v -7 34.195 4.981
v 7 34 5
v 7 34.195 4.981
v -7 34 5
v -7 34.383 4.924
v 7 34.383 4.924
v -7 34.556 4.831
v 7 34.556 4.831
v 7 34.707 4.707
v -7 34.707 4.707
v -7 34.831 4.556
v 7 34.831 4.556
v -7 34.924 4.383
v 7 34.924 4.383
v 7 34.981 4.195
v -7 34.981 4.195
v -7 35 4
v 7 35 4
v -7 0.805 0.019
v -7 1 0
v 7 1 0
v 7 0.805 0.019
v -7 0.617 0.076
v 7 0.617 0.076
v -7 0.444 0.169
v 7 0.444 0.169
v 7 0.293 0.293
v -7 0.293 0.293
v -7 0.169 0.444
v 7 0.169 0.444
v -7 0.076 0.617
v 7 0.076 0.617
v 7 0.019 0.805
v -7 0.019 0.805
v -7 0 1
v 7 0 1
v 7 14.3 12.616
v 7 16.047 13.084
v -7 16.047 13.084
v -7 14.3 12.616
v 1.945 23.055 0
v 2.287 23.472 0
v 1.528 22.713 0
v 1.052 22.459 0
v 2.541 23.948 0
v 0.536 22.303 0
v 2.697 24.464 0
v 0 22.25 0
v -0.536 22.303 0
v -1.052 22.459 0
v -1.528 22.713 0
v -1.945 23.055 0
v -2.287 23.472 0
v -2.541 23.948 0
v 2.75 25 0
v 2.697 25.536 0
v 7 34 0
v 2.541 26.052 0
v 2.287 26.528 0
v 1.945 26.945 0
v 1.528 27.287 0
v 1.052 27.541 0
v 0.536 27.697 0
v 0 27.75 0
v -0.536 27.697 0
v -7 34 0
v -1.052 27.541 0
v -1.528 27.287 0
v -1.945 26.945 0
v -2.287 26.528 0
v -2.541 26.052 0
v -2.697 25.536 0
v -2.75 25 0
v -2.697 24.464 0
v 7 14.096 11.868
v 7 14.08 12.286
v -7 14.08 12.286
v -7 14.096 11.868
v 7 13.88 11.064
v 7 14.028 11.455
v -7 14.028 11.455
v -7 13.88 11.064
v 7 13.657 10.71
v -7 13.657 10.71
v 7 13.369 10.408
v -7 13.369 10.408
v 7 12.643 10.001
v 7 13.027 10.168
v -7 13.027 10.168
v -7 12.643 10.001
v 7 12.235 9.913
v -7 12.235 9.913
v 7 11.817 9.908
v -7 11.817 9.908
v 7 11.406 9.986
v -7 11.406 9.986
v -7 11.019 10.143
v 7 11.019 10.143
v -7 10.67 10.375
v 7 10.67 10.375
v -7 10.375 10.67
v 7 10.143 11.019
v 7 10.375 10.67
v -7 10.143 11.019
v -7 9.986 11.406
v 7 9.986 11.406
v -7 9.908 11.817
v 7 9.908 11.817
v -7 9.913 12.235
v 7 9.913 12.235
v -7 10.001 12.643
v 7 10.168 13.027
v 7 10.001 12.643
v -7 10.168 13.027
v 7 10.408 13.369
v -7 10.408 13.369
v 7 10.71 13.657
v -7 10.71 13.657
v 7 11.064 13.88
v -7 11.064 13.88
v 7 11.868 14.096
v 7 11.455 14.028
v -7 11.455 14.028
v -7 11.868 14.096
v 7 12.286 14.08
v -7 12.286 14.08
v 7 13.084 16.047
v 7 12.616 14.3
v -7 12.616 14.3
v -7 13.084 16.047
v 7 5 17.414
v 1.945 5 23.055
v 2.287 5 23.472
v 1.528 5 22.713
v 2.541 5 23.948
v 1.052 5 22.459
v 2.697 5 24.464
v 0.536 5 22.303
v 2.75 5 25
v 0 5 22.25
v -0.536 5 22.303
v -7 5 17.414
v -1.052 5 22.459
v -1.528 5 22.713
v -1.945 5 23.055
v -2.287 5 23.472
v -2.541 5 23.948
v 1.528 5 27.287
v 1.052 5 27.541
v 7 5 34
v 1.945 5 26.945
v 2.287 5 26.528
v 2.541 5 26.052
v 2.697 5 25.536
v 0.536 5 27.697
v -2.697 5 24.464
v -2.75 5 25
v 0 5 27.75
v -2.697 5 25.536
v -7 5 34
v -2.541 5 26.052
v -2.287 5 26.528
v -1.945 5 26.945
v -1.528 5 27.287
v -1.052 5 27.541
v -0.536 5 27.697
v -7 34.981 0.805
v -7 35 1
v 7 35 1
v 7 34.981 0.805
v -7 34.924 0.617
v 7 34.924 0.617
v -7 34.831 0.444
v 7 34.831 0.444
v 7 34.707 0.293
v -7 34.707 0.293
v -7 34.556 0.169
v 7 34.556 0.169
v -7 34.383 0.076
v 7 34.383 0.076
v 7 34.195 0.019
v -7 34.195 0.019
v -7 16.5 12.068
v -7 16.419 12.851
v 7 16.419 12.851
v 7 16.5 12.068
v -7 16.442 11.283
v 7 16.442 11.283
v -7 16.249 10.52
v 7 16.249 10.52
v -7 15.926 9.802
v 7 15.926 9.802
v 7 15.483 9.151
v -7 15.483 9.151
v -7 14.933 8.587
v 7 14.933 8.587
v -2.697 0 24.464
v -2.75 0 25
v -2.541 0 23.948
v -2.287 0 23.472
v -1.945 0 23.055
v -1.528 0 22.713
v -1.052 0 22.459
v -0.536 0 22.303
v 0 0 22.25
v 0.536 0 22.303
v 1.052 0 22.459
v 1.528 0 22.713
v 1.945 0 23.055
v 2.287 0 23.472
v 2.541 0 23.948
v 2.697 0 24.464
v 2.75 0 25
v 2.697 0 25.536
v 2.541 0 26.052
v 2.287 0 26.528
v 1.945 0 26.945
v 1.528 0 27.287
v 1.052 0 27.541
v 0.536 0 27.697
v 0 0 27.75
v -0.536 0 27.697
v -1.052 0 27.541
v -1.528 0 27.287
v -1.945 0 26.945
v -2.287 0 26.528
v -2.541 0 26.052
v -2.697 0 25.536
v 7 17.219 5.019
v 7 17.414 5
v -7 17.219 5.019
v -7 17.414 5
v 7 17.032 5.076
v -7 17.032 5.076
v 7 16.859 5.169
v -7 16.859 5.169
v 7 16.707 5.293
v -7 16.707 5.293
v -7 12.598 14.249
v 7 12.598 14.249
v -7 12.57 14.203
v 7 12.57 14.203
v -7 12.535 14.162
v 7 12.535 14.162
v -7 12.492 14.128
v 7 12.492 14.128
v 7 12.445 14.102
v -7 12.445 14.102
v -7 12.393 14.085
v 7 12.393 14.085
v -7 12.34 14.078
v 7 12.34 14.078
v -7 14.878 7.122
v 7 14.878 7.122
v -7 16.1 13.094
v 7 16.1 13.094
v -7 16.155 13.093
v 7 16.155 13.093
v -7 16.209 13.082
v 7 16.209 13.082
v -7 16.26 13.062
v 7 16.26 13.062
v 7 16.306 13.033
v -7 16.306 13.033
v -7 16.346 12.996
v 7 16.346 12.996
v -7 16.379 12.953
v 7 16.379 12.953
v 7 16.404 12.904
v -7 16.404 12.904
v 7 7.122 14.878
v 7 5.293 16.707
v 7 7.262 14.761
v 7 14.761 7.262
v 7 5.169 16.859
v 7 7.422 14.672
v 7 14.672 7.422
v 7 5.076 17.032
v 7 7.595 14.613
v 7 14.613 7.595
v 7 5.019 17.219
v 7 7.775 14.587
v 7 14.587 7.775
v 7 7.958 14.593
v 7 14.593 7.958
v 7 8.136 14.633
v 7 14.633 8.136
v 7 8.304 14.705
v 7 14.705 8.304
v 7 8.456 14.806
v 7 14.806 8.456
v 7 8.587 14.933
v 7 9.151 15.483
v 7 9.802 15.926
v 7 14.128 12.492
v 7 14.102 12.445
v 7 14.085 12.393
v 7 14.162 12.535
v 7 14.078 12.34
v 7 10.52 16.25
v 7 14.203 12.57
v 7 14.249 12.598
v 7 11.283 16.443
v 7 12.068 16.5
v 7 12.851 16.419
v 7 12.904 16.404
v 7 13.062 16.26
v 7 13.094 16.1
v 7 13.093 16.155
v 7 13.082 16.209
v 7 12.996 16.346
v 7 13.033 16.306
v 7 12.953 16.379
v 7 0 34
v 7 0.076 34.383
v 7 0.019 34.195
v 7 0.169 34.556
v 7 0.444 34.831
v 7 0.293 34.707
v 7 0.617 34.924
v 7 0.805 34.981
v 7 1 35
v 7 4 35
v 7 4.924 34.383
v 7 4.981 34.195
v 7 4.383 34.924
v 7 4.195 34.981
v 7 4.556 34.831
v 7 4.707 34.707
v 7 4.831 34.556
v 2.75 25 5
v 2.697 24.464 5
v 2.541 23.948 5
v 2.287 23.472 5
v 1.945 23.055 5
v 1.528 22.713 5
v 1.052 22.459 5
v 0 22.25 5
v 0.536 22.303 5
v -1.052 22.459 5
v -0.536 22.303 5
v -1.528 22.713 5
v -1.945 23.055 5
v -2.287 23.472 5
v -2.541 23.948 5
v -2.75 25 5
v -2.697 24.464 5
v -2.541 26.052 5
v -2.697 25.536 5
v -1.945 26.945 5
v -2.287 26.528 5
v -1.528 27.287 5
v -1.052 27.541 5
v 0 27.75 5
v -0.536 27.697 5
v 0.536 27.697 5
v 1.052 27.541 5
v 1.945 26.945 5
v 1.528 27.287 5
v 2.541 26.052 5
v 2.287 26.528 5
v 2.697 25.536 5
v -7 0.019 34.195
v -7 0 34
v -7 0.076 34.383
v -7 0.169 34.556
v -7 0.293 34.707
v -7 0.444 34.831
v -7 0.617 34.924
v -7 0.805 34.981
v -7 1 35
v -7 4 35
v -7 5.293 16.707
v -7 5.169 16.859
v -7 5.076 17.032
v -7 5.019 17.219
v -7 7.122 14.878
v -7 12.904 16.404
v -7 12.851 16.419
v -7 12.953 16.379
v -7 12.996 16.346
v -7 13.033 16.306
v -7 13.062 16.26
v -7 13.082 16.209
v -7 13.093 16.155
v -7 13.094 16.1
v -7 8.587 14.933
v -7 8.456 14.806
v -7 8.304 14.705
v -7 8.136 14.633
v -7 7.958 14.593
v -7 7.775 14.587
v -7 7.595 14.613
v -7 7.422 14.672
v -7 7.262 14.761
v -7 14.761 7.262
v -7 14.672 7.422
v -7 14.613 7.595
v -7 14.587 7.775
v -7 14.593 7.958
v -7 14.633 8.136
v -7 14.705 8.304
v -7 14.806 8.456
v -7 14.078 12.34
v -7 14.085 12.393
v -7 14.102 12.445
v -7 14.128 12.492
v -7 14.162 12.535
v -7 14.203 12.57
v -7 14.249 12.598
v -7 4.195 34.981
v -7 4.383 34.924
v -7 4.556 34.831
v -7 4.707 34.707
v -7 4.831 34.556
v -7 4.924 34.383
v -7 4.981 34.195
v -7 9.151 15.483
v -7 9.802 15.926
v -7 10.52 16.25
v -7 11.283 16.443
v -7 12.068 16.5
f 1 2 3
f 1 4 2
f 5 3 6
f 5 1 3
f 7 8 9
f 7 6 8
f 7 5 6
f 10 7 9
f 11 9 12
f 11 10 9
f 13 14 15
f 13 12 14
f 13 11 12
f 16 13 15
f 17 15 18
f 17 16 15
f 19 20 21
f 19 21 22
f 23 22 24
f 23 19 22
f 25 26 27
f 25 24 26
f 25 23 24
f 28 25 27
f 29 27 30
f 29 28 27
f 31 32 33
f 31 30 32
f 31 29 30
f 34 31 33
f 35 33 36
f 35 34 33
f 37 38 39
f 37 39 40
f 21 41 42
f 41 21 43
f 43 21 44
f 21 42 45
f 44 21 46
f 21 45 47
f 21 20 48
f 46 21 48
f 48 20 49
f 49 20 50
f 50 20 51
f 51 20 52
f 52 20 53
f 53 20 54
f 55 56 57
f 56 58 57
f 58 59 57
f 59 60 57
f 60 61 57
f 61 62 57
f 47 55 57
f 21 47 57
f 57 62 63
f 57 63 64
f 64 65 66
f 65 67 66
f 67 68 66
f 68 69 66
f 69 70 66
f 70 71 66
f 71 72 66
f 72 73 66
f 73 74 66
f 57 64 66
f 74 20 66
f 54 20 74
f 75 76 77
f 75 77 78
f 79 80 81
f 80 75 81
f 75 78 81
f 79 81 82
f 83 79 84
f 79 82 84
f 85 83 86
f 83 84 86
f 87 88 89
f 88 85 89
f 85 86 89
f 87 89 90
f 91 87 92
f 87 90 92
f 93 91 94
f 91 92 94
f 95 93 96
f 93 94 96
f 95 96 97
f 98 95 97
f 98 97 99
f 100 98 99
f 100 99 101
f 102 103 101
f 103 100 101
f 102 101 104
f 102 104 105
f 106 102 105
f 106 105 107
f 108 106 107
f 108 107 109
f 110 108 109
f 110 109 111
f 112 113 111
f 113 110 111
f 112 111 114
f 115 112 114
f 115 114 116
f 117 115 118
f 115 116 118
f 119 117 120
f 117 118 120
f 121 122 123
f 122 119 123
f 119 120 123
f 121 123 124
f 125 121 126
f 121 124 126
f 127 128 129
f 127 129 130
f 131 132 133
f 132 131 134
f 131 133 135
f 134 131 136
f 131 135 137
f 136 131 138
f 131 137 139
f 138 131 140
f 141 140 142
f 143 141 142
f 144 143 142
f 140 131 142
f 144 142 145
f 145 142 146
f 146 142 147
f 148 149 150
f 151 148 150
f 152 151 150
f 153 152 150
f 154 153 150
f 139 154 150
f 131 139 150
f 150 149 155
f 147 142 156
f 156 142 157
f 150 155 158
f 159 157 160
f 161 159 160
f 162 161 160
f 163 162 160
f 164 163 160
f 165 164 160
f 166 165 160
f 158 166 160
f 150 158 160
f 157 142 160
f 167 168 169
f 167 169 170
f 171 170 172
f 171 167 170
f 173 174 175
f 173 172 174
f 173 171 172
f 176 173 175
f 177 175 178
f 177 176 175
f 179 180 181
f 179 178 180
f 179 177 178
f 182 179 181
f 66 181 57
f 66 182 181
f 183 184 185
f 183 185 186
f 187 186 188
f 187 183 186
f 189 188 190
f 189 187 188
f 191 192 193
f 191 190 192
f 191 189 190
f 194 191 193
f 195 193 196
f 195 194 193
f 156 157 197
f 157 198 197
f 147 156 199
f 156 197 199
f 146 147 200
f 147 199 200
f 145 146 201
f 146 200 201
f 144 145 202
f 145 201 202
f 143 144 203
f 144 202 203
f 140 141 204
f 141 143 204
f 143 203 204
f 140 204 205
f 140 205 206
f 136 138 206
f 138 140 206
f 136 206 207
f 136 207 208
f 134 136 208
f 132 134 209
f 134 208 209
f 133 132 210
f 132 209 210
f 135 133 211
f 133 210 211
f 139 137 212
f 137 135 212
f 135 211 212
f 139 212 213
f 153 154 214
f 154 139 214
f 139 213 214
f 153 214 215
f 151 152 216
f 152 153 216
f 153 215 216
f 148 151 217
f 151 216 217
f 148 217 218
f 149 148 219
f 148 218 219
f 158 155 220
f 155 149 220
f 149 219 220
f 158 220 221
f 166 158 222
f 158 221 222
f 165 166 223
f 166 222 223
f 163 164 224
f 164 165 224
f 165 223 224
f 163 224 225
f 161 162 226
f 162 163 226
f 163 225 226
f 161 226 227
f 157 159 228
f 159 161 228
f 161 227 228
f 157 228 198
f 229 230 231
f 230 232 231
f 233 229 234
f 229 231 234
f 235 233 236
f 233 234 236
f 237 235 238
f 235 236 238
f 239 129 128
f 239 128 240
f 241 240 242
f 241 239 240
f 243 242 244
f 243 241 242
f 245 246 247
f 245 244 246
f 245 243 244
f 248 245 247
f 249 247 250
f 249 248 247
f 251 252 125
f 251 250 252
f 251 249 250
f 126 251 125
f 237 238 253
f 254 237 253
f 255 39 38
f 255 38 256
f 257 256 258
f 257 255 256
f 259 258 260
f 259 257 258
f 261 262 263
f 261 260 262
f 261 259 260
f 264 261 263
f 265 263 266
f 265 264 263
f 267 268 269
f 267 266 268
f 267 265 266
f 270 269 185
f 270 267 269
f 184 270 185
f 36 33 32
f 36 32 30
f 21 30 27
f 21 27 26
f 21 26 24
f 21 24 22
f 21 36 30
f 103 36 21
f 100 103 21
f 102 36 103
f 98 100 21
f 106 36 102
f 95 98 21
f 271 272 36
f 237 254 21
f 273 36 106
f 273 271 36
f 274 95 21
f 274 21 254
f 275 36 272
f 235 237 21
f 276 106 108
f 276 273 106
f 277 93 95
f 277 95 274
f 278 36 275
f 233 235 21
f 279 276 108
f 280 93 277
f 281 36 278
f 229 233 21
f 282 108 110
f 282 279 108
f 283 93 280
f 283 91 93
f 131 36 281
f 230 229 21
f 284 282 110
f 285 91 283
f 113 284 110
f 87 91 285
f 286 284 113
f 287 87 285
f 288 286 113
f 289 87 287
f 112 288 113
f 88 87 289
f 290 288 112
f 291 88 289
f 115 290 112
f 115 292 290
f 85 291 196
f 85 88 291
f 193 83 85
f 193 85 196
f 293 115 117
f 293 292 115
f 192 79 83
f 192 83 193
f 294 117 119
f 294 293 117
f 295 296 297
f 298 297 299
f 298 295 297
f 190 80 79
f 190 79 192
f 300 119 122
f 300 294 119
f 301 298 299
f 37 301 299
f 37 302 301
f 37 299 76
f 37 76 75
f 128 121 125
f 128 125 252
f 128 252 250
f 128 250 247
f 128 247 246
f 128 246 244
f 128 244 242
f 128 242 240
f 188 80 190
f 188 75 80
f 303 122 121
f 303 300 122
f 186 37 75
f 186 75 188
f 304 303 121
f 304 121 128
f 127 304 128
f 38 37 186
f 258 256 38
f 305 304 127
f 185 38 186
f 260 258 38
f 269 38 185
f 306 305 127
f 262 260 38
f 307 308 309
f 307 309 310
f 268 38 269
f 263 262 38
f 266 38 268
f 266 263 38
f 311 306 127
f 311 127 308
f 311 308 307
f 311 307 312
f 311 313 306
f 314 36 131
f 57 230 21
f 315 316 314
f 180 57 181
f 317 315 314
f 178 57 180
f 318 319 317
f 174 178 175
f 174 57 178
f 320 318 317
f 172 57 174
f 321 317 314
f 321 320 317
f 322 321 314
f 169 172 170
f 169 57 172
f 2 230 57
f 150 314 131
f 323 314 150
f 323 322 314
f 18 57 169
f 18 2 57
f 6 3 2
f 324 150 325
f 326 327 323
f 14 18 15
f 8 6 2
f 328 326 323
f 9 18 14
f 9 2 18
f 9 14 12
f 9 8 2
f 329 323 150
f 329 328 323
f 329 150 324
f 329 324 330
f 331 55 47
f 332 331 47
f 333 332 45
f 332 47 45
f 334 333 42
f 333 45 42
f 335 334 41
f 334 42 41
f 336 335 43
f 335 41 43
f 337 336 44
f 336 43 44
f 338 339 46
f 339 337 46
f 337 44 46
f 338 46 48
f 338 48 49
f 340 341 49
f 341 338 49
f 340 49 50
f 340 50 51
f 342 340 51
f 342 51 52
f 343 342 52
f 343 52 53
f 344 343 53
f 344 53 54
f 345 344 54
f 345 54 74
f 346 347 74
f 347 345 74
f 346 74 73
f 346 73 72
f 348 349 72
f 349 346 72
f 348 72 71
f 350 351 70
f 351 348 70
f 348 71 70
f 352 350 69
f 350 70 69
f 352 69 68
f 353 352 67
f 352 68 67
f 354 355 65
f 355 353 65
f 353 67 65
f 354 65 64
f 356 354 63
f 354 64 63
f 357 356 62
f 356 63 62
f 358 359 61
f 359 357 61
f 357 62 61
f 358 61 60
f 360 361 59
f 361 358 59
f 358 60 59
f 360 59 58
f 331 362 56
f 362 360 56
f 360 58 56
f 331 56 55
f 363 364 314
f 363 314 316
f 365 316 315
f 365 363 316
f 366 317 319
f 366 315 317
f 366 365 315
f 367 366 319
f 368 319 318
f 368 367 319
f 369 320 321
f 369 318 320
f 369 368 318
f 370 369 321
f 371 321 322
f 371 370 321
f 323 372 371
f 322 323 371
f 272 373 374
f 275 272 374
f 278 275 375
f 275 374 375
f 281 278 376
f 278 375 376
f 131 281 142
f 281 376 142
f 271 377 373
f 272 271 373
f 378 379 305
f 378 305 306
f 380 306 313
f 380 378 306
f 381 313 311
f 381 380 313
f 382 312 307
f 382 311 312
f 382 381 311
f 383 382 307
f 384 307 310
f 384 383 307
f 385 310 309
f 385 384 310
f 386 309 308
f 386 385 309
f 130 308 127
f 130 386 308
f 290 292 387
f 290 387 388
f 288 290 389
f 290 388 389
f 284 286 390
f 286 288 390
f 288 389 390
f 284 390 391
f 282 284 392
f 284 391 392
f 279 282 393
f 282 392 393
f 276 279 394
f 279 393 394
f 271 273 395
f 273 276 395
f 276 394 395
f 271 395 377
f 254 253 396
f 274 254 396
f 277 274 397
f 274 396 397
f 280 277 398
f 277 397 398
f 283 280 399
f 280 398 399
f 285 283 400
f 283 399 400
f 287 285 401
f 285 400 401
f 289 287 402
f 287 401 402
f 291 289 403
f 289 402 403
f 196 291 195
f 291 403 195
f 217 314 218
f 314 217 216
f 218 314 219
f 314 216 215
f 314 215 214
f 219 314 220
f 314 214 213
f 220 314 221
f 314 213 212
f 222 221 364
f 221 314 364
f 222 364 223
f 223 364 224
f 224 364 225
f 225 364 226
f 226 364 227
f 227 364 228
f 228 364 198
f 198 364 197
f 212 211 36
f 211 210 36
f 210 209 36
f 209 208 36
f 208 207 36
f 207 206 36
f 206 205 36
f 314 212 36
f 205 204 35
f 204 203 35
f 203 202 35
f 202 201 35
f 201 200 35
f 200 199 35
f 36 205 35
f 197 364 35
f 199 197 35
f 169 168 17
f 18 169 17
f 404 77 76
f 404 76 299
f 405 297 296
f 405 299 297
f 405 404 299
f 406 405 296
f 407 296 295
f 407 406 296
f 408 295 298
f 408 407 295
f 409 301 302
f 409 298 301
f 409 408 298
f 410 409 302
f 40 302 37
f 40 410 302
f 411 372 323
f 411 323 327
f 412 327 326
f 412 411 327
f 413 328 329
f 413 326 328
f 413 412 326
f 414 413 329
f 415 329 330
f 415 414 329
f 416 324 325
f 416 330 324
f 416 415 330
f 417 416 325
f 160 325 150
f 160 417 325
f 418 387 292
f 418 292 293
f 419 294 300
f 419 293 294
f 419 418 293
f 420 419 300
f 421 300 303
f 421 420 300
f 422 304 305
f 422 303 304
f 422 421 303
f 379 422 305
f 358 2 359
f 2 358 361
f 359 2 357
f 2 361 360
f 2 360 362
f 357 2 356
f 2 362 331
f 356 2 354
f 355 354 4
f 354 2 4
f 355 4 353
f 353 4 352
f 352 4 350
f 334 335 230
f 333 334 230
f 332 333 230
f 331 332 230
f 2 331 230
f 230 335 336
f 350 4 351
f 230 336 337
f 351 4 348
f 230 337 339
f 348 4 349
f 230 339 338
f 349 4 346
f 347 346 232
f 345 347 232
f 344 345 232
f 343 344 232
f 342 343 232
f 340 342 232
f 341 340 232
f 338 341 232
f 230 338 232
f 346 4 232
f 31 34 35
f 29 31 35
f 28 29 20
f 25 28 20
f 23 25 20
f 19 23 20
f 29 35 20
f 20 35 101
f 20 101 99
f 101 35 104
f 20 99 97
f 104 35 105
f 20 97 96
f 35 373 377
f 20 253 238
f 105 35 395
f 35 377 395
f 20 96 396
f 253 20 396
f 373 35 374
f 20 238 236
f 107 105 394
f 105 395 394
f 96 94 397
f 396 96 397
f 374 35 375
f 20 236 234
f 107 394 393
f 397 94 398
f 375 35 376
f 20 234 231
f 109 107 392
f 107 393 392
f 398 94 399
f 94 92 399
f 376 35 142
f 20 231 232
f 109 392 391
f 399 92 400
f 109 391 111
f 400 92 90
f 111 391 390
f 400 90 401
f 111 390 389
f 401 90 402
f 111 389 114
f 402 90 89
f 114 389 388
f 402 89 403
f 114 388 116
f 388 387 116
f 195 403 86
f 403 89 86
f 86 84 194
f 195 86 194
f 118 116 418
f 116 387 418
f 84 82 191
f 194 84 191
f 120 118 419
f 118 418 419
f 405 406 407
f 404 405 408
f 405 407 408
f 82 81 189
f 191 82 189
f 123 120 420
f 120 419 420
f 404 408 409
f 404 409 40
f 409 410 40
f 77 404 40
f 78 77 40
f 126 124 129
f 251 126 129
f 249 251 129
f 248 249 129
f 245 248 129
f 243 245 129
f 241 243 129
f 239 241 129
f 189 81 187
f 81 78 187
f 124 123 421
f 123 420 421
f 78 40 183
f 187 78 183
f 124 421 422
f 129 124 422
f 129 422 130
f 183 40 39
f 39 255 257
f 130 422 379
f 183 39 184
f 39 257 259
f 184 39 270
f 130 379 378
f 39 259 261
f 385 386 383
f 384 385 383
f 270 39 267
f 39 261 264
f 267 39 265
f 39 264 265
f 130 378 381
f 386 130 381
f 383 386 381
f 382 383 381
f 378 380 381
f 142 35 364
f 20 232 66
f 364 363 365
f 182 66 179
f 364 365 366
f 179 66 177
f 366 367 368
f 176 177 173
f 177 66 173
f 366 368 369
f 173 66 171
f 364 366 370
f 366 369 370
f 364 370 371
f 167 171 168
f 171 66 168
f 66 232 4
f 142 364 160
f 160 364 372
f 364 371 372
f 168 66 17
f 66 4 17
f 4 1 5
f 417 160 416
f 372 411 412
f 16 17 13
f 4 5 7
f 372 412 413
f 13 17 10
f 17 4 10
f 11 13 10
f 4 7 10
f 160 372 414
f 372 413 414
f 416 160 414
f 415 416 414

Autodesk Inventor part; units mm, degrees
sketch "Sketch_1" plane through (0, 0, 0) normal (1, 0, 0) x (0, 1, 0)
  line L0 (4, 35) -> (1, 35)
  arc A0 (1, 35) -> (0, 34) centre (1, 34) ccw
  line L1 (0, 34) -> (0, 1)
  arc A1 (0, 1) -> (1, 0) centre (1, 1) ccw
  line L2 (1, 0) -> (34, 0)
  arc A2 (34, 0) -> (35, 1) centre (34, 1) ccw
  line L3 (35, 1) -> (35, 4)
  arc A3 (35, 4) -> (34, 5) centre (34, 4) ccw
  line L4 (34, 5) -> (17.4142, 5)
  arc A4 (16.7071, 5.2929) -> (17.4142, 5) centre (17.4142, 6) ccw
  line L5 (16.7071, 5.2929) -> (14.878, 7.122)
  arc A5 (14.9333, 8.5874) -> (14.878, 7.122) centre (15.5851, 7.8291) ccw
  arc A6 (14.9333, 8.5874) -> (16.4188, 12.8512) centre (12, 12) ccw
  arc A7 (16.4188, 12.8512) -> (16.0465, 13.0843) centre (16.1242, 12.7945) ccw
  line L6 (16.0465, 13.0843) -> (14.3, 12.6163)
  arc A8 (14.3, 12.6163) -> (14.0805, 12.2857) centre (14.3777, 12.3265) ccw
  arc A9 (12.2857, 14.0805) -> (14.0805, 12.2857) centre (12, 12) ccw
  arc A10 (12.2857, 14.0805) -> (12.6163, 14.3) centre (12.3265, 14.3777) ccw
  line L7 (12.6163, 14.3) -> (13.0843, 16.0465)
  arc A11 (13.0843, 16.0465) -> (12.8512, 16.4188) centre (12.7945, 16.1242) ccw
  arc A12 (12.8512, 16.4188) -> (8.5874, 14.9333) centre (12, 12) ccw
  arc A13 (7.122, 14.878) -> (8.5874, 14.9333) centre (7.8291, 15.5851) ccw
  line L8 (7.122, 14.878) -> (5.2929, 16.7071)
  arc A14 (5, 17.4142) -> (5.2929, 16.7071) centre (6, 17.4142) ccw
  line L9 (5, 17.4142) -> (5, 34)
  arc A15 (5, 34) -> (4, 35) centre (4, 34) ccw
extrude "Extrusion1" add sketch "Sketch_1" along normal mid plane 14
sketch "Sketch_2" plane through (0, 0, 0) normal (0, 0, 1) x (1, 0, 0)
  circle A0 centre (0, 25) radius 2.75
extrude "Extrusion2" cut sketch "Sketch_2" along normal mid plane 10
sketch "Sketch_3" plane through (0, 0, 0) normal (0, 1, 0) x (-1, 0, 0)
  circle A0 centre (0, 25) radius 2.75
extrude "Extrusion3" cut sketch "Sketch_3" along normal mid plane 10
ref_plane "bracket_to_dummy_XY" through (0, 0, 0) normal (0, 1, 0) x (1, 0, 0)
ref_plane "bracket_to_dummy_YZ" through (0, 0, 0) normal (1, 0, 0) x (0, 0, -1)
ref_plane "bracket_to_dummy_ZX" through (0, 0, 0) normal (0, 0, -1) x (0, 1, 0)
ref_plane "to_bolt_1_6_XY" through (0, 25, 5) normal (0, 0, 1) x (1, 0, 0)
ref_plane "to_bolt_1_6_YZ" through (0, 25, 5) normal (1, 0, 0) x (0, 1, 0)
ref_plane "to_bolt_1_6_ZX" through (0, 25, 5) normal (0, 1, 0) x (0, 0, 1)
ref_plane "to_bolt_1_6_base_XY" through (0, 5, 25) normal (0, 1, 0) x (1, 0, 0)
ref_plane "to_bolt_1_6_base_YZ" through (0, 5, 25) normal (1, 0, 0) x (0, 0, -1)
ref_plane "to_bolt_1_6_base_ZX" through (0, 5, 25) normal (0, 0, -1) x (0, 1, 0)
ref_plane "to_nut_1_6_XY" through (0, 25, -2) normal (0, 0, 1) x (1, 0, 0)
ref_plane "to_nut_1_6_YZ" through (0, 25, -2) normal (1, 0, 0) x (0, 1, 0)
ref_plane "to_nut_1_6_ZX" through (0, 25, -2) normal (0, 1, 0) x (0, 0, 1)
ref_plane "to_nut_1_6_base_XY" through (0, -2, 25) normal (0, 1, 0) x (1, 0, 0)
ref_plane "to_nut_1_6_base_YZ" through (0, -2, 25) normal (1, 0, 0) x (0, 0, -1)
ref_plane "to_nut_1_6_base_ZX" through (0, -2, 25) normal (0, 0, -1) x (0, 1, 0)
ref_plane "to_screw_XY" through (0, 5, 25) normal (0, 1, 0) x (1, 0, 0)
ref_plane "to_screw_YZ" through (0, 5, 25) normal (1, 0, 0) x (0, 0, -1)
ref_plane "to_screw_ZX" through (0, 5, 25) normal (0, 0, -1) x (0, 1, 0)
ref_plane "to_screw10_XY" through (0, 5, 25) normal (0, 1, 0) x (1, 0, 0)
ref_plane "to_screw10_YZ" through (0, 5, 25) normal (1, 0, 0) x (0, 0, -1)
ref_plane "to_screw10_ZX" through (0, 5, 25) normal (0, 0, -1) x (0, 1, 0)
ref_plane "to_screw2_XY" through (0, 5, 25) normal (0, 1, 0) x (1, 0, 0)
ref_plane "to_screw2_YZ" through (0, 5, 25) normal (1, 0, 0) x (0, 0, -1)
ref_plane "to_screw2_ZX" through (0, 5, 25) normal (0, 0, -1) x (0, 1, 0)
ref_plane "to_screw3_XY" through (0, 25, 5) normal (0, 0, 1) x (1, 0, 0)
ref_plane "to_screw3_YZ" through (0, 25, 5) normal (1, 0, 0) x (0, 1, 0)
ref_plane "to_screw3_ZX" through (0, 25, 5) normal (0, 1, 0) x (0, 0, 1)
ref_plane "to_screw4_XY" through (0, 25, 5) normal (0, 0, 1) x (1, 0, 0)
ref_plane "to_screw4_YZ" through (0, 25, 5) normal (1, 0, 0) x (0, 1, 0)
ref_plane "to_screw4_ZX" through (0, 25, 5) normal (0, 1, 0) x (0, 0, 1)
ref_plane "to_screw5_XY" through (0, 5, 25) normal (0, 1, 0) x (1, 0, 0)
ref_plane "to_screw5_YZ" through (0, 5, 25) normal (1, 0, 0) x (0, 0, -1)
ref_plane "to_screw5_ZX" through (0, 5, 25) normal (0, 0, -1) x (0, 1, 0)
ref_plane "to_screw6_XY" through (0, 5, 25) normal (0, 1, 0) x (1, 0, 0)
ref_plane "to_screw6_YZ" through (0, 5, 25) normal (1, 0, 0) x (0, 0, -1)
ref_plane "to_screw6_ZX" through (0, 5, 25) normal (0, 0, -1) x (0, 1, 0)
ref_plane "to_screw7_XY" through (0, 25, 5) normal (0, 0, 1) x (1, 0, 0)
ref_plane "to_screw7_YZ" through (0, 25, 5) normal (1, 0, 0) x (0, 1, 0)
ref_plane "to_screw7_ZX" through (0, 25, 5) normal (0, 1, 0) x (0, 0, 1)
ref_plane "to_screw8_XY" through (0, 25, 5) normal (0, 0, 1) x (1, 0, 0)
ref_plane "to_screw8_YZ" through (0, 25, 5) normal (1, 0, 0) x (0, 1, 0)
ref_plane "to_screw8_ZX" through (0, 25, 5) normal (0, 1, 0) x (0, 0, 1)
ref_plane "to_screw9_XY" through (0, 25, 5) normal (0, 0, 1) x (1, 0, 0)
ref_plane "to_screw9_YZ" through (0, 25, 5) normal (1, 0, 0) x (0, 1, 0)
ref_plane "to_screw9_ZX" through (0, 25, 5) normal (0, 1, 0) x (0, 0, 1)
properties part number "NBLTS5_b"
